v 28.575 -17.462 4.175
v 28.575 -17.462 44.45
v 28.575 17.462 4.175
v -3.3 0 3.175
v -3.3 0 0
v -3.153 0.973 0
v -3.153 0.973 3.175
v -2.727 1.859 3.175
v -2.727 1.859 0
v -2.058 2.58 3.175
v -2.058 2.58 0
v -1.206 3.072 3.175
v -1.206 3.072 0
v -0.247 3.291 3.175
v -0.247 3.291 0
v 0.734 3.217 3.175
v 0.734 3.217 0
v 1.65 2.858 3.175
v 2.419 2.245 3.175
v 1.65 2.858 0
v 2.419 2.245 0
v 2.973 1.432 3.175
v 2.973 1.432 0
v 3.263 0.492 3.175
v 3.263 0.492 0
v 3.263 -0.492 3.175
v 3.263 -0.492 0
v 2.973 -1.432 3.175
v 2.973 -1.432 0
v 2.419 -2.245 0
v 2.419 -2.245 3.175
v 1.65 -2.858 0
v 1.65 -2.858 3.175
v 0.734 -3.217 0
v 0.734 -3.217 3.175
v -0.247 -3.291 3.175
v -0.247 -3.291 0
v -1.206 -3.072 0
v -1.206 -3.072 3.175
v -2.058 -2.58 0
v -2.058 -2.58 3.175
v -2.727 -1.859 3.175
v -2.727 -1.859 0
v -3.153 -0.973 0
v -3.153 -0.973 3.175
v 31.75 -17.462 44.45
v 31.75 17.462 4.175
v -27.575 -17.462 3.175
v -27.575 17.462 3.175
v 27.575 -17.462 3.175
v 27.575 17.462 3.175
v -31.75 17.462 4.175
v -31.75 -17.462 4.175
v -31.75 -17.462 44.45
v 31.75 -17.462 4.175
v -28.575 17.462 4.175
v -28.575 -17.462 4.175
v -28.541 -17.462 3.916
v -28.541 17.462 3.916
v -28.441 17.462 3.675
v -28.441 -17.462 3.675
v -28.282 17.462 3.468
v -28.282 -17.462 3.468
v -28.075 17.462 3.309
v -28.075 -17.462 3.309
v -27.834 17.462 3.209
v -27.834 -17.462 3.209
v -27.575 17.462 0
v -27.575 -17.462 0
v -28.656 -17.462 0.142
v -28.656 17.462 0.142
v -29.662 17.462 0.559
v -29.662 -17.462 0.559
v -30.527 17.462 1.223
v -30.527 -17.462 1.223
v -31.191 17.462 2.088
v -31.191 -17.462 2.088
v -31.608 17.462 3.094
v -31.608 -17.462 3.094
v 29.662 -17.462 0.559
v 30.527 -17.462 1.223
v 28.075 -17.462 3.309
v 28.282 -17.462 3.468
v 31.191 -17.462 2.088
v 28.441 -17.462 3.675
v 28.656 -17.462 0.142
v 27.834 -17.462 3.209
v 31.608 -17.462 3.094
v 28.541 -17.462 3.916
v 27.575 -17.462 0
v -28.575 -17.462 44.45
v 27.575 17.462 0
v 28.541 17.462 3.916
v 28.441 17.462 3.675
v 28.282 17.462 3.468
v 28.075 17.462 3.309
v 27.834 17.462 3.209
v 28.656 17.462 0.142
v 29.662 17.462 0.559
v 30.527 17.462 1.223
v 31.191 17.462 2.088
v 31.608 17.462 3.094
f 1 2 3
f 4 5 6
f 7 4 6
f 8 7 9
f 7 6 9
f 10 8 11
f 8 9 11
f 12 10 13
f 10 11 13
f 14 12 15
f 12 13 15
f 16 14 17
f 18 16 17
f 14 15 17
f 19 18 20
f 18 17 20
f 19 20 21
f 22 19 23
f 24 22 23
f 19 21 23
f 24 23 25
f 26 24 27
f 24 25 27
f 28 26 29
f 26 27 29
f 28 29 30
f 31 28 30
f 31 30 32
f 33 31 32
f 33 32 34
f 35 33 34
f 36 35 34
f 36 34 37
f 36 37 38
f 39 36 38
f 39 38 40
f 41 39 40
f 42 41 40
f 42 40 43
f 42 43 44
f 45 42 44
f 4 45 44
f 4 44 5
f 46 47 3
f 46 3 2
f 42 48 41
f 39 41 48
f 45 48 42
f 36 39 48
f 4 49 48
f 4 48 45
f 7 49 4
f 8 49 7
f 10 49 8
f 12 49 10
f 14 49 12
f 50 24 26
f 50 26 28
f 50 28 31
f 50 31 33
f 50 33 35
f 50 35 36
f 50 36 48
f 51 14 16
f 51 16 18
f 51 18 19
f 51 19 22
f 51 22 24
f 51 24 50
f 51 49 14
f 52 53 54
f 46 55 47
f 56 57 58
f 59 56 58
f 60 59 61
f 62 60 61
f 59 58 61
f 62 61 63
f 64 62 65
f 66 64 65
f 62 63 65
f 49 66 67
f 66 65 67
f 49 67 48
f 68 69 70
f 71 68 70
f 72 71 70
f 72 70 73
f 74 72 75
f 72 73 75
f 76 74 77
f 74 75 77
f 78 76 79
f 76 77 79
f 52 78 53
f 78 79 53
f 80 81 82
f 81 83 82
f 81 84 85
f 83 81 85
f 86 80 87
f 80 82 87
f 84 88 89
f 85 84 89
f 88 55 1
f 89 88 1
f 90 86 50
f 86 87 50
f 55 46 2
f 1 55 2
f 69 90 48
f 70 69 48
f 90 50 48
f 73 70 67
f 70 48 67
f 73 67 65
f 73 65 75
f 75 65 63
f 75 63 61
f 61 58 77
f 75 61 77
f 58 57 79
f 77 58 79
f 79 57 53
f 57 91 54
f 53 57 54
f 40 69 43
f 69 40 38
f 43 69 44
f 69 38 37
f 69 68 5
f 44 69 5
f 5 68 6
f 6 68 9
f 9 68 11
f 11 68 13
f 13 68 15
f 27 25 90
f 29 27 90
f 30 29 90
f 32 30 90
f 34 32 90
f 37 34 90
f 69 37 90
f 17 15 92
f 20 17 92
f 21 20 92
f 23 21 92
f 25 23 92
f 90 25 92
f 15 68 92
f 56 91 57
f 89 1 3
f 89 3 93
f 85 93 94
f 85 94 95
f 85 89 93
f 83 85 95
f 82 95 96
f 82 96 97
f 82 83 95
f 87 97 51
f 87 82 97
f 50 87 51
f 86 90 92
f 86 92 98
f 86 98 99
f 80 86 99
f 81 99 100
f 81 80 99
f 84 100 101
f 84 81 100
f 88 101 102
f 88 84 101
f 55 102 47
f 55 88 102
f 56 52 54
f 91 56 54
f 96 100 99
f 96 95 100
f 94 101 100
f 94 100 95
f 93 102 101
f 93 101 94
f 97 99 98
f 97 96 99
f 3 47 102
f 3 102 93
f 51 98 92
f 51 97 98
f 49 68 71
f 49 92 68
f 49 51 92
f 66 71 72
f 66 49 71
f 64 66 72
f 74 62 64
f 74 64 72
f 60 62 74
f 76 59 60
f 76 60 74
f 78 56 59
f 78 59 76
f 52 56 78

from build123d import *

# Parameters (mm, degrees)
SKETCH2_W                    = 57.15
SKETCH2_H                    = 34.925
BASE_FLANGE1_DEPTH           = 3.175
EDGE_FLANGE1_STRIP_W         = 14.7
EDGE_FLANGE1_STRIP_H         = 3.175
EDGE_FLANGE1_STRIP_CUT_DEPTH = 34.925
EDGE_FLANGE1_DEPTH           = 34.925
CUT_EXTRUDE1_DEPTH           = 3.175
M6_CLEARANCE_HOLE1_D         = 6.6


# Sheet-metal steps are written as plain solids
with BuildPart() as part:
    # Sketch2 → Base-Flange1 (new body)
    with BuildSketch(Plane.XY):
        Rectangle(SKETCH2_W, SKETCH2_H)
    extrude(amount=BASE_FLANGE1_DEPTH)

    # Edge-Flange1 strip (across the edge) → Edge-Flange1 strip cut (cut)
    with BuildSketch(Plane(origin=(28.575, -17.4625, 3.175), x_dir=(-1, 0, 0), z_dir=(0, 1, 0))):
        with Locations((-6.35, -1.5875)):
            Rectangle(EDGE_FLANGE1_STRIP_W, EDGE_FLANGE1_STRIP_H)
    edge_flange1_strip_cut = extrude(amount=EDGE_FLANGE1_STRIP_CUT_DEPTH, mode=Mode.SUBTRACT)

    # Edge-Flange1 section (across the edge) → Edge-Flange1 (add)
    with BuildSketch(Plane(origin=(28.575, -17.4625, 3.175), x_dir=(-1, 0, 0), z_dir=(0, 1, 0))):
        with BuildLine():
            Line((-3.175, 1), (-3.175, 41.275))
            Line((-3.175, 41.275), (0, 41.275))
            Line((0, 41.275), (0, 1))
            ThreePointArc((0, 1), (0.292893219, 0.292893219), (1, 0))
            Line((1, 0), (1, -3.175))
            ThreePointArc((1, -3.175), (-1.952170811, -1.952170811), (-3.175, 1))
        make_face()
    edge_flange1 = extrude(amount=EDGE_FLANGE1_DEPTH)

    # Sketch10 → Cut-Extrude1 (cut)
    with BuildSketch(Plane(origin=(31.75, 0, 0), x_dir=(0, 0, -1), z_dir=(1, 0, 0))):
        Polygon((-4.175, 17.4625), (-44.45, -17.4625), (-44.45, 17.4625), align=None)
    cut_extrude1 = extrude(amount=-CUT_EXTRUDE1_DEPTH, mode=Mode.SUBTRACT)

    # Mirror1: Edge-Flange1 strip cut, Edge-Flange1, Cut-Extrude1 across plane
    add(edge_flange1_strip_cut.mirror(Plane(origin=(0, 0, 0), x_dir=(0, 0, 1), z_dir=(1, 0, 0))), mode=Mode.SUBTRACT)
    add(edge_flange1.mirror(Plane(origin=(0, 0, 0), x_dir=(0, 0, 1), z_dir=(1, 0, 0))))
    add(cut_extrude1.mirror(Plane(origin=(0, 0, 0), x_dir=(0, 0, 1), z_dir=(1, 0, 0))), mode=Mode.SUBTRACT)

    # M6 Clearance Hole1 (through all)
    with Locations(Plane.XY.offset(3.175)):
        with Locations((0, 0)):
            Hole(M6_CLEARANCE_HOLE1_D / 2)


solid = part.part
